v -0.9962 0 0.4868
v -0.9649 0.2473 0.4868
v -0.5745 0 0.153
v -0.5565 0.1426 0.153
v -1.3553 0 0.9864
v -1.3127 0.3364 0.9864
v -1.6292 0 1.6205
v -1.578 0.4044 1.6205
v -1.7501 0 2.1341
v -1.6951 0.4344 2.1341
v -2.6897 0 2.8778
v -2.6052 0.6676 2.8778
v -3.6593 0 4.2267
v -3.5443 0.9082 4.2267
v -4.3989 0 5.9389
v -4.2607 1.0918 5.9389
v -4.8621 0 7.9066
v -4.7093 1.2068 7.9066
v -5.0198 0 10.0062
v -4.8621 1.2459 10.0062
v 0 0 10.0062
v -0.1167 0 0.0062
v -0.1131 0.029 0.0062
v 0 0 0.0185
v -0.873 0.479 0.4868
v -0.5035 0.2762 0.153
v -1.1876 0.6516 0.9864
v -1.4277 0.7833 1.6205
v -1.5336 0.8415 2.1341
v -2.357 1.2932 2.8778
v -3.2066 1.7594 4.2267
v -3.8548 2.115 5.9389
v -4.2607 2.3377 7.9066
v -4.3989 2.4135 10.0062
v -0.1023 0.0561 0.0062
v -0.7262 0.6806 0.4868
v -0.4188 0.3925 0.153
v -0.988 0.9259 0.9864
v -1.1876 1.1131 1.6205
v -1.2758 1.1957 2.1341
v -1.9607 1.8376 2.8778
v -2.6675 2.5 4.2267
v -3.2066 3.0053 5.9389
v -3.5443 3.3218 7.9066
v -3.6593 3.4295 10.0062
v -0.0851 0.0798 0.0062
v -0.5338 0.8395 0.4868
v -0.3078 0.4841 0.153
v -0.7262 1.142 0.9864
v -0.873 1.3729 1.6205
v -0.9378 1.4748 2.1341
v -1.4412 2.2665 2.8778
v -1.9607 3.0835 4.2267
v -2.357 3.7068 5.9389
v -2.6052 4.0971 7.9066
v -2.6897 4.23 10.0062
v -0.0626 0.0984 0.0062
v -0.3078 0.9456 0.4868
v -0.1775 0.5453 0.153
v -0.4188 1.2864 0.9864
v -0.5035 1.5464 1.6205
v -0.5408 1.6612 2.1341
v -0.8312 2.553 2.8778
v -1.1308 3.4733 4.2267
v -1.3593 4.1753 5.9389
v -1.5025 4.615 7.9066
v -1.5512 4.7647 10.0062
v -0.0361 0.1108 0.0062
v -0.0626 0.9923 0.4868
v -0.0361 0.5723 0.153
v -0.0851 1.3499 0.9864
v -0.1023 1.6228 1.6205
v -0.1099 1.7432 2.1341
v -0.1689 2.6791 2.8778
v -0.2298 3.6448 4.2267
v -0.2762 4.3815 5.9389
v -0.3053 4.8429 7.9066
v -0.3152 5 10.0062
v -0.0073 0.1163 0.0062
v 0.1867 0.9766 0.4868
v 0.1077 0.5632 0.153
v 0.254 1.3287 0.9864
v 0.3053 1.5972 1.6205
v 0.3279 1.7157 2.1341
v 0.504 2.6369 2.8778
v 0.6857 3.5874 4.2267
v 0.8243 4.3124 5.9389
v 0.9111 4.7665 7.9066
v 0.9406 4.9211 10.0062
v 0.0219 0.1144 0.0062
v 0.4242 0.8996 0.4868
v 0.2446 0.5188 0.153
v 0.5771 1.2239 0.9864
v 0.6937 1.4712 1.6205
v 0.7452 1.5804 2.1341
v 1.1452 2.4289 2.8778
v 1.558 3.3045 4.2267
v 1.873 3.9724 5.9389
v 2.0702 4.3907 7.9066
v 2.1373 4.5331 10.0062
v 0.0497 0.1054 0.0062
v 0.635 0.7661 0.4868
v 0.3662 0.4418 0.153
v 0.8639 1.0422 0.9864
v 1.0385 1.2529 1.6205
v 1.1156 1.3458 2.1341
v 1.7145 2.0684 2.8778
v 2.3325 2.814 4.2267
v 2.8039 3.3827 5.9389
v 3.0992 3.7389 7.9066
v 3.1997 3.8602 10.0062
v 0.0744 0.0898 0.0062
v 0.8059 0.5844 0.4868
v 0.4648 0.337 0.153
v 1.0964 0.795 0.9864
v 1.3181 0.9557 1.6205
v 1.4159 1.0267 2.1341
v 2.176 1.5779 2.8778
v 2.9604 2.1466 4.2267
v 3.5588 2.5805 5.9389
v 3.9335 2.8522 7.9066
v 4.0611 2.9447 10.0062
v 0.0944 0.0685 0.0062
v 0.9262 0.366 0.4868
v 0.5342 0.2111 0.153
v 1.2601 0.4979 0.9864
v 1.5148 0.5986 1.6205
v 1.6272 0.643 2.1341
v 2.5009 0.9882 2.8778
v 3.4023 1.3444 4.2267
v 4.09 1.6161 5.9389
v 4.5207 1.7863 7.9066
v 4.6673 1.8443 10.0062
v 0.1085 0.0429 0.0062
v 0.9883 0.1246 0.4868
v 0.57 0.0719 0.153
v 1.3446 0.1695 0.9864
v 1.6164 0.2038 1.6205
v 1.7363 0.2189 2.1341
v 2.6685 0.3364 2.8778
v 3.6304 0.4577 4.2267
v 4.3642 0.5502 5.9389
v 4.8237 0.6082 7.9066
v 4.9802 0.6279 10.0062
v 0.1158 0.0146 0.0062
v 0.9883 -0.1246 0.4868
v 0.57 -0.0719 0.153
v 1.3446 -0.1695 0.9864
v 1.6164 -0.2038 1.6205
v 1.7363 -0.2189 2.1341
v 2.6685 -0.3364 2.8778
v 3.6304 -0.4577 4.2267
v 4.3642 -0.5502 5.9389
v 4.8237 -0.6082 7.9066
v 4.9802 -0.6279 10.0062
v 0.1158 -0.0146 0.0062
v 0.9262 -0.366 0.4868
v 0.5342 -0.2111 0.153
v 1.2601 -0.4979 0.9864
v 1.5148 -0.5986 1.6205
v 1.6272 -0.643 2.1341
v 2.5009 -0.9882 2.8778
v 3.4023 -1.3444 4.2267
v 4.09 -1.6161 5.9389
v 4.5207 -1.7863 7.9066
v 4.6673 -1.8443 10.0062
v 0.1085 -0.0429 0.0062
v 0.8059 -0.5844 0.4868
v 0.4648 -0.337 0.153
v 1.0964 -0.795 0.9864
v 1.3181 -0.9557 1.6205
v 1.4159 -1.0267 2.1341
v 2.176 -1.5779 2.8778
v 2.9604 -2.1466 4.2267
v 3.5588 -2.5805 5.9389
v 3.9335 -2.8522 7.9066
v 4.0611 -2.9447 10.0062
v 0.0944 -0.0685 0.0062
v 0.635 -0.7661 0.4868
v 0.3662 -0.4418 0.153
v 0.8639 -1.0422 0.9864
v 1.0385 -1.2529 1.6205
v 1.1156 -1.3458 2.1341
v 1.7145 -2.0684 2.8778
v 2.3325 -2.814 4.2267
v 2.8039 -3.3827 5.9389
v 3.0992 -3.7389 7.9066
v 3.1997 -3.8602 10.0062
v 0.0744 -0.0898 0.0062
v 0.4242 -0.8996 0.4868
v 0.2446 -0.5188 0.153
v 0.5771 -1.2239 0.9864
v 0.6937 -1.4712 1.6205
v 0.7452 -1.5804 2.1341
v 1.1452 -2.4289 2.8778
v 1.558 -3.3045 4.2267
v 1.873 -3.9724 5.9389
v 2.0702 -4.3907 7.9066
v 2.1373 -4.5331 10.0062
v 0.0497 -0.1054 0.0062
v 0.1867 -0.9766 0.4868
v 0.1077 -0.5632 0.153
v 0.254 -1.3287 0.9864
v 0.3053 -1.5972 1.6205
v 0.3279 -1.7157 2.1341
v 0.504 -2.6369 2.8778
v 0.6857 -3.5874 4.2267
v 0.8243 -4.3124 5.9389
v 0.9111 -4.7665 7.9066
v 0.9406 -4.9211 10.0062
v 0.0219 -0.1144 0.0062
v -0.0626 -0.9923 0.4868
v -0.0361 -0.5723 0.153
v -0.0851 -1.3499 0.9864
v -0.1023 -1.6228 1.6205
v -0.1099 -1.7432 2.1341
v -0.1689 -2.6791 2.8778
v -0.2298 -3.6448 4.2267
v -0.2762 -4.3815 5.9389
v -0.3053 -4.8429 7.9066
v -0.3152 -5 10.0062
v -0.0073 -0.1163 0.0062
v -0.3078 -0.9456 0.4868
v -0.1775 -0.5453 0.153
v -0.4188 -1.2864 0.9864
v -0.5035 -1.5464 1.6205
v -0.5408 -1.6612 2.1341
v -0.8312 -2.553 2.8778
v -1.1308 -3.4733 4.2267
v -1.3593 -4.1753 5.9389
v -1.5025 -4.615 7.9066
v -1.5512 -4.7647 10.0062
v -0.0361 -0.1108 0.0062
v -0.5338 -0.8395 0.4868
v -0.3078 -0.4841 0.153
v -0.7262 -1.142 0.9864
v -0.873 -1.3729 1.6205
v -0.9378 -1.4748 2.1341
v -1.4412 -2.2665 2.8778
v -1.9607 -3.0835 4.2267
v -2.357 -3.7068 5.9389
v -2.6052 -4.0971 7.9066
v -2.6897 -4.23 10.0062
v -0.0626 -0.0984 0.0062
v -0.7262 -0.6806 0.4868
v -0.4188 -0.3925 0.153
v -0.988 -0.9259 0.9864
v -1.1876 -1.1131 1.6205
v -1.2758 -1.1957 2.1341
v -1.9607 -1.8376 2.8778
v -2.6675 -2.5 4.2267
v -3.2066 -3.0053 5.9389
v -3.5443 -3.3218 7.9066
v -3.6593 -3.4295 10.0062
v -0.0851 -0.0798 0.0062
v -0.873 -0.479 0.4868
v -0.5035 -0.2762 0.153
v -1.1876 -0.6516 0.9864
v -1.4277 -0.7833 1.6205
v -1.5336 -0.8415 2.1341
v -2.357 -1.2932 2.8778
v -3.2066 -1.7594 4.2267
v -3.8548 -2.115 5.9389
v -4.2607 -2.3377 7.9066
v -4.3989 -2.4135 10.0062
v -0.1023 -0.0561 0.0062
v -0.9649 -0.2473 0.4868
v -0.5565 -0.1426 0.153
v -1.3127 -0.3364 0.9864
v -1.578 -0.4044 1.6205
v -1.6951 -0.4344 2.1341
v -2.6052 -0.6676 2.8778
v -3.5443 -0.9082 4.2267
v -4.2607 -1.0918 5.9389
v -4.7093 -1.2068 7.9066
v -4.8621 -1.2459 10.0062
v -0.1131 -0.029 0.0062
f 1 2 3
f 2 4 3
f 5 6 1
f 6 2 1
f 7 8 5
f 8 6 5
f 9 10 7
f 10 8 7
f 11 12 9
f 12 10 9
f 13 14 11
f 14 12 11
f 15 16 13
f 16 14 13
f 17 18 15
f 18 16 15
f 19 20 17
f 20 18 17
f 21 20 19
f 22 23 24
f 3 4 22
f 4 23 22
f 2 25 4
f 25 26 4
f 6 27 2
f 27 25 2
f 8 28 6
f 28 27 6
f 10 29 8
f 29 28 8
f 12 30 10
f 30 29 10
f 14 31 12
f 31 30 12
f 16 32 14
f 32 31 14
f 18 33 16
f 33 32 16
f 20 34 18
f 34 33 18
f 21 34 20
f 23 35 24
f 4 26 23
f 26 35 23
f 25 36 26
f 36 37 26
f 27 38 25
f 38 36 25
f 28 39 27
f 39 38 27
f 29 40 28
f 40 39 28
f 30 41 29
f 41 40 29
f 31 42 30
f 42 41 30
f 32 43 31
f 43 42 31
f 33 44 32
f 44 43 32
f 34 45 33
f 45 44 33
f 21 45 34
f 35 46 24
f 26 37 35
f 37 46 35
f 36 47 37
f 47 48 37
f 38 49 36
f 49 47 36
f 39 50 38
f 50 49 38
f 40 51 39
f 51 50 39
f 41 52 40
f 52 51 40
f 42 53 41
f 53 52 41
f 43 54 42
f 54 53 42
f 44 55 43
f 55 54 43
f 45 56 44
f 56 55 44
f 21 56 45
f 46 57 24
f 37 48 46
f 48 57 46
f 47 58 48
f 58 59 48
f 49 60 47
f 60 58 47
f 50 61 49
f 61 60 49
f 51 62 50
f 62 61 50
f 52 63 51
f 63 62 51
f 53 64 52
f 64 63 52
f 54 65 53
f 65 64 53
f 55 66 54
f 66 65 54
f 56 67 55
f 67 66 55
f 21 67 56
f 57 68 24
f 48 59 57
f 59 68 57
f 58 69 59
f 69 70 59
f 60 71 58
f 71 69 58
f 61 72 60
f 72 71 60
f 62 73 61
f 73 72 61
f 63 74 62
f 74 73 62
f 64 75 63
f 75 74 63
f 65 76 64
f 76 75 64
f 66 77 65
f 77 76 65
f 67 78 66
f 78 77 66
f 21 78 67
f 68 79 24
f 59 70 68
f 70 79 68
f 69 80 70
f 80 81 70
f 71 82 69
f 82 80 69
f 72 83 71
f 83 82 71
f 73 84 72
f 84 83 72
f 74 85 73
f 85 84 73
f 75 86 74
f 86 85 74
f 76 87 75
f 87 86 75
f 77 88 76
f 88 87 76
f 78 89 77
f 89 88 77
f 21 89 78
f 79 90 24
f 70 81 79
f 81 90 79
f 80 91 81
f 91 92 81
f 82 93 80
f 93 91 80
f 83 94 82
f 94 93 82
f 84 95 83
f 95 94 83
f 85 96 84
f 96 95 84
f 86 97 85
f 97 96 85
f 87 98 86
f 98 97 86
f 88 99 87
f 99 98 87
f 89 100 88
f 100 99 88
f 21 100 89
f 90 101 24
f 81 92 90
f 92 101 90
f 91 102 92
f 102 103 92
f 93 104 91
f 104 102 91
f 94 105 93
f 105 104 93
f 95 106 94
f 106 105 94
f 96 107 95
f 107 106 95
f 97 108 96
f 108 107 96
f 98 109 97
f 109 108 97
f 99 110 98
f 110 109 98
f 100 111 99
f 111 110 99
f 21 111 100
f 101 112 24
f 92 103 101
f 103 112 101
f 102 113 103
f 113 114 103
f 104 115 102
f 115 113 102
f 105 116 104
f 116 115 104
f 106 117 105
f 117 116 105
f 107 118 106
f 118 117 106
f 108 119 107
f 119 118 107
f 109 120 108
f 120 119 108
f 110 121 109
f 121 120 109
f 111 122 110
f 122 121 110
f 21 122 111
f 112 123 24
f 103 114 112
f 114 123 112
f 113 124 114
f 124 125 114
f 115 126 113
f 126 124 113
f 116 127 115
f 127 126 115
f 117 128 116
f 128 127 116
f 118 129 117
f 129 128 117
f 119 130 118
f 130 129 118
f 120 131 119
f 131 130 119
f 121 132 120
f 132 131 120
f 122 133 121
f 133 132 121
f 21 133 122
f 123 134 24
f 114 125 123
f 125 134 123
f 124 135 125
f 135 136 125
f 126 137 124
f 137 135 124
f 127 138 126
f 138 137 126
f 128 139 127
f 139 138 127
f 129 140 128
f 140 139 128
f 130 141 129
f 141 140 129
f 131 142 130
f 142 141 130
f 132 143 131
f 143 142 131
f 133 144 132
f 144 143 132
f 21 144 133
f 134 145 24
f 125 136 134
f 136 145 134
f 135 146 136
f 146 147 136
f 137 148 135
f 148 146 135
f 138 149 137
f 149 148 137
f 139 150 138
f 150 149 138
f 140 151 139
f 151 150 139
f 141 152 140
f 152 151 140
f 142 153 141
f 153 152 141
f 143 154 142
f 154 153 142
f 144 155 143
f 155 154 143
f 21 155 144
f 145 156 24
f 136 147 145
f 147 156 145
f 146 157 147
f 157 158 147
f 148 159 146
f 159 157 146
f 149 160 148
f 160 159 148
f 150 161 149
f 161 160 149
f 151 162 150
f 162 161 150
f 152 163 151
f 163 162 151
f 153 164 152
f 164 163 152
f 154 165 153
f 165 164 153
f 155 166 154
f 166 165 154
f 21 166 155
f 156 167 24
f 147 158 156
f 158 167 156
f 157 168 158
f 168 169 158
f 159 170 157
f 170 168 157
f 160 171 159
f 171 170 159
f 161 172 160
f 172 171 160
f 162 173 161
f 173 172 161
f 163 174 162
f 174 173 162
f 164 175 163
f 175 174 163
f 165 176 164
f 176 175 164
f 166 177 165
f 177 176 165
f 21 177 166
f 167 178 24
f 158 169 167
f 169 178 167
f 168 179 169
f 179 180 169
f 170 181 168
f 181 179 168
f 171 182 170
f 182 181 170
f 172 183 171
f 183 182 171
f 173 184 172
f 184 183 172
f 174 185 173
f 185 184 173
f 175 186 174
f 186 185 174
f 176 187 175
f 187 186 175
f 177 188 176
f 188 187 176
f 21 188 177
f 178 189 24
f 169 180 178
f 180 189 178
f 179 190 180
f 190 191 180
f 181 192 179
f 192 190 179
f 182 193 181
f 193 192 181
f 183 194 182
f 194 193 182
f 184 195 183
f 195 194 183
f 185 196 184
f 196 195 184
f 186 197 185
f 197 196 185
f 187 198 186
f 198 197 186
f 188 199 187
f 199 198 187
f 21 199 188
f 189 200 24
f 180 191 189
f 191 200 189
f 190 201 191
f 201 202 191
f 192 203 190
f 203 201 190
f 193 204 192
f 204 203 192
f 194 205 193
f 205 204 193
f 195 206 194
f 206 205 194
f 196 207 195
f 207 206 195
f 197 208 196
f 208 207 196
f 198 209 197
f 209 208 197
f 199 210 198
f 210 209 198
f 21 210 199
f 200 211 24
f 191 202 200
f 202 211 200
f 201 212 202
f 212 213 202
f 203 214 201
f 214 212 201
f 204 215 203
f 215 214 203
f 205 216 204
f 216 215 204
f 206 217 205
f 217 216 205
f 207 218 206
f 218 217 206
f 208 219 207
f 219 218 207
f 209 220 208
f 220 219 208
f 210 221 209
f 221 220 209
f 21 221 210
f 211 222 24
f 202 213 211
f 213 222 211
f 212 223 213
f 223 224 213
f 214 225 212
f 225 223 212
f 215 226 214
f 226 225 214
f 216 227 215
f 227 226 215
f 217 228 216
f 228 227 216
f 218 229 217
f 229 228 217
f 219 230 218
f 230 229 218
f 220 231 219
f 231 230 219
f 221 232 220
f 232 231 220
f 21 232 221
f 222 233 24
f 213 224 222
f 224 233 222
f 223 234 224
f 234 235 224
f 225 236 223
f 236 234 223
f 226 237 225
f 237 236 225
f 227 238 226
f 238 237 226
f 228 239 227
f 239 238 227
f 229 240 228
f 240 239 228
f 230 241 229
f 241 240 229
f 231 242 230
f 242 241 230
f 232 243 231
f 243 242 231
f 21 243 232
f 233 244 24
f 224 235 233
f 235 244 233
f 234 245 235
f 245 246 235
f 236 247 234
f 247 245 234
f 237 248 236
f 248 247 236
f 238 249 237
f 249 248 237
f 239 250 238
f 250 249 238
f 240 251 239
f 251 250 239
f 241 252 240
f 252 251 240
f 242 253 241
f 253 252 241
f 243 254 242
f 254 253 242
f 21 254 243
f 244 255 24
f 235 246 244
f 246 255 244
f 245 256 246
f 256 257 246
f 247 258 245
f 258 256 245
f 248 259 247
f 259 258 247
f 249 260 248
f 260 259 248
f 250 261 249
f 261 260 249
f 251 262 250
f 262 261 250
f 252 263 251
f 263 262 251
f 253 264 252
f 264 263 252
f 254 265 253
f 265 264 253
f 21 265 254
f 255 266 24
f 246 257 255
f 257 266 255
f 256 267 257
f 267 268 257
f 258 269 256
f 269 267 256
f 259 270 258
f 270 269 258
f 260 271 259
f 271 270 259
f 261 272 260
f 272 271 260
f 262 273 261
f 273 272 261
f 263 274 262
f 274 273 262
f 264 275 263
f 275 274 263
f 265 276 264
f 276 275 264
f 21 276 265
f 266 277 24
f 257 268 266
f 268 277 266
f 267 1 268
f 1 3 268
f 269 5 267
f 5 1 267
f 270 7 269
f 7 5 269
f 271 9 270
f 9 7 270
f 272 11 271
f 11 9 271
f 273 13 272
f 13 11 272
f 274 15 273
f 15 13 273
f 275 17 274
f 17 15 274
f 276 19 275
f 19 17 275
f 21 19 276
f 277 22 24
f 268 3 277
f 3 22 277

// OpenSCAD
//VARIABLES
2D_resolution = 25; //the $fn value on all 2D objects. I find 50 good to edit with, and 250 produces smooth prints. 
3D_resolution = 25; //the $fn value on all 3D objects. I find 50 good to edit with, and 250 produces smooth prints.
height_multiplier = 10;
width_multiplier = 10;
ped_height = 20;
//ped_taper_angle
ped_base_radius = 20;
main_radius = 10;
main_radius_vertical_offset = -20;
top_radius = 27;
top_radius__vertical_offset = -15;
minkowski_sphere_radius = 3;



//COMPUTED VARIABLES
main_circle_y_translation = (ped_height + main_radius_vertical_offset + main_radius);
top_circle_y_translation = (main_circle_y_translation + main_radius + top_radius__vertical_offset + top_radius);

halfing_square_width = (main_radius >= top_radius) ? main_radius : top_radius;
halfing_square_height = (2*main_radius + top_radius + ped_height);




//MODULES
module body() {
    rotate_extrude($fn=3D_resolution){
        difference(){
            union(){
                translate([0,(main_circle_y_translation),0]) circle(main_radius, $fn=2D_resolution);
                translate([0,(top_circle_y_translation),0]) circle(top_radius, $fn=2D_resolution);
            }
            translate([(-1*halfing_square_width),0,0])square([halfing_square_width,halfing_square_height]);
            translate([(-1*top_radius),(top_circle_y_translation),0]) square((2*top_radius));
        }
    }
}

module pedestal() {
	rotate_extrude($fn=3D_resolution){
		polygon([[(-1*ped_base_radius),0],[ped_base_radius,0],[0,ped_height]]);
	}
}

module body_smoothed() {
	minkowski(){	
	    body();
	    sphere(minkowski_sphere_radius, center=true);
	}
}

module main() {
	union(){
		body();
		//body_smoothed();
		pedestal();
	}
}

module make_cup(){
	resize(newsize=[width_multiplier, width_multiplier, height_multiplier]) main();
}

make_cup();
